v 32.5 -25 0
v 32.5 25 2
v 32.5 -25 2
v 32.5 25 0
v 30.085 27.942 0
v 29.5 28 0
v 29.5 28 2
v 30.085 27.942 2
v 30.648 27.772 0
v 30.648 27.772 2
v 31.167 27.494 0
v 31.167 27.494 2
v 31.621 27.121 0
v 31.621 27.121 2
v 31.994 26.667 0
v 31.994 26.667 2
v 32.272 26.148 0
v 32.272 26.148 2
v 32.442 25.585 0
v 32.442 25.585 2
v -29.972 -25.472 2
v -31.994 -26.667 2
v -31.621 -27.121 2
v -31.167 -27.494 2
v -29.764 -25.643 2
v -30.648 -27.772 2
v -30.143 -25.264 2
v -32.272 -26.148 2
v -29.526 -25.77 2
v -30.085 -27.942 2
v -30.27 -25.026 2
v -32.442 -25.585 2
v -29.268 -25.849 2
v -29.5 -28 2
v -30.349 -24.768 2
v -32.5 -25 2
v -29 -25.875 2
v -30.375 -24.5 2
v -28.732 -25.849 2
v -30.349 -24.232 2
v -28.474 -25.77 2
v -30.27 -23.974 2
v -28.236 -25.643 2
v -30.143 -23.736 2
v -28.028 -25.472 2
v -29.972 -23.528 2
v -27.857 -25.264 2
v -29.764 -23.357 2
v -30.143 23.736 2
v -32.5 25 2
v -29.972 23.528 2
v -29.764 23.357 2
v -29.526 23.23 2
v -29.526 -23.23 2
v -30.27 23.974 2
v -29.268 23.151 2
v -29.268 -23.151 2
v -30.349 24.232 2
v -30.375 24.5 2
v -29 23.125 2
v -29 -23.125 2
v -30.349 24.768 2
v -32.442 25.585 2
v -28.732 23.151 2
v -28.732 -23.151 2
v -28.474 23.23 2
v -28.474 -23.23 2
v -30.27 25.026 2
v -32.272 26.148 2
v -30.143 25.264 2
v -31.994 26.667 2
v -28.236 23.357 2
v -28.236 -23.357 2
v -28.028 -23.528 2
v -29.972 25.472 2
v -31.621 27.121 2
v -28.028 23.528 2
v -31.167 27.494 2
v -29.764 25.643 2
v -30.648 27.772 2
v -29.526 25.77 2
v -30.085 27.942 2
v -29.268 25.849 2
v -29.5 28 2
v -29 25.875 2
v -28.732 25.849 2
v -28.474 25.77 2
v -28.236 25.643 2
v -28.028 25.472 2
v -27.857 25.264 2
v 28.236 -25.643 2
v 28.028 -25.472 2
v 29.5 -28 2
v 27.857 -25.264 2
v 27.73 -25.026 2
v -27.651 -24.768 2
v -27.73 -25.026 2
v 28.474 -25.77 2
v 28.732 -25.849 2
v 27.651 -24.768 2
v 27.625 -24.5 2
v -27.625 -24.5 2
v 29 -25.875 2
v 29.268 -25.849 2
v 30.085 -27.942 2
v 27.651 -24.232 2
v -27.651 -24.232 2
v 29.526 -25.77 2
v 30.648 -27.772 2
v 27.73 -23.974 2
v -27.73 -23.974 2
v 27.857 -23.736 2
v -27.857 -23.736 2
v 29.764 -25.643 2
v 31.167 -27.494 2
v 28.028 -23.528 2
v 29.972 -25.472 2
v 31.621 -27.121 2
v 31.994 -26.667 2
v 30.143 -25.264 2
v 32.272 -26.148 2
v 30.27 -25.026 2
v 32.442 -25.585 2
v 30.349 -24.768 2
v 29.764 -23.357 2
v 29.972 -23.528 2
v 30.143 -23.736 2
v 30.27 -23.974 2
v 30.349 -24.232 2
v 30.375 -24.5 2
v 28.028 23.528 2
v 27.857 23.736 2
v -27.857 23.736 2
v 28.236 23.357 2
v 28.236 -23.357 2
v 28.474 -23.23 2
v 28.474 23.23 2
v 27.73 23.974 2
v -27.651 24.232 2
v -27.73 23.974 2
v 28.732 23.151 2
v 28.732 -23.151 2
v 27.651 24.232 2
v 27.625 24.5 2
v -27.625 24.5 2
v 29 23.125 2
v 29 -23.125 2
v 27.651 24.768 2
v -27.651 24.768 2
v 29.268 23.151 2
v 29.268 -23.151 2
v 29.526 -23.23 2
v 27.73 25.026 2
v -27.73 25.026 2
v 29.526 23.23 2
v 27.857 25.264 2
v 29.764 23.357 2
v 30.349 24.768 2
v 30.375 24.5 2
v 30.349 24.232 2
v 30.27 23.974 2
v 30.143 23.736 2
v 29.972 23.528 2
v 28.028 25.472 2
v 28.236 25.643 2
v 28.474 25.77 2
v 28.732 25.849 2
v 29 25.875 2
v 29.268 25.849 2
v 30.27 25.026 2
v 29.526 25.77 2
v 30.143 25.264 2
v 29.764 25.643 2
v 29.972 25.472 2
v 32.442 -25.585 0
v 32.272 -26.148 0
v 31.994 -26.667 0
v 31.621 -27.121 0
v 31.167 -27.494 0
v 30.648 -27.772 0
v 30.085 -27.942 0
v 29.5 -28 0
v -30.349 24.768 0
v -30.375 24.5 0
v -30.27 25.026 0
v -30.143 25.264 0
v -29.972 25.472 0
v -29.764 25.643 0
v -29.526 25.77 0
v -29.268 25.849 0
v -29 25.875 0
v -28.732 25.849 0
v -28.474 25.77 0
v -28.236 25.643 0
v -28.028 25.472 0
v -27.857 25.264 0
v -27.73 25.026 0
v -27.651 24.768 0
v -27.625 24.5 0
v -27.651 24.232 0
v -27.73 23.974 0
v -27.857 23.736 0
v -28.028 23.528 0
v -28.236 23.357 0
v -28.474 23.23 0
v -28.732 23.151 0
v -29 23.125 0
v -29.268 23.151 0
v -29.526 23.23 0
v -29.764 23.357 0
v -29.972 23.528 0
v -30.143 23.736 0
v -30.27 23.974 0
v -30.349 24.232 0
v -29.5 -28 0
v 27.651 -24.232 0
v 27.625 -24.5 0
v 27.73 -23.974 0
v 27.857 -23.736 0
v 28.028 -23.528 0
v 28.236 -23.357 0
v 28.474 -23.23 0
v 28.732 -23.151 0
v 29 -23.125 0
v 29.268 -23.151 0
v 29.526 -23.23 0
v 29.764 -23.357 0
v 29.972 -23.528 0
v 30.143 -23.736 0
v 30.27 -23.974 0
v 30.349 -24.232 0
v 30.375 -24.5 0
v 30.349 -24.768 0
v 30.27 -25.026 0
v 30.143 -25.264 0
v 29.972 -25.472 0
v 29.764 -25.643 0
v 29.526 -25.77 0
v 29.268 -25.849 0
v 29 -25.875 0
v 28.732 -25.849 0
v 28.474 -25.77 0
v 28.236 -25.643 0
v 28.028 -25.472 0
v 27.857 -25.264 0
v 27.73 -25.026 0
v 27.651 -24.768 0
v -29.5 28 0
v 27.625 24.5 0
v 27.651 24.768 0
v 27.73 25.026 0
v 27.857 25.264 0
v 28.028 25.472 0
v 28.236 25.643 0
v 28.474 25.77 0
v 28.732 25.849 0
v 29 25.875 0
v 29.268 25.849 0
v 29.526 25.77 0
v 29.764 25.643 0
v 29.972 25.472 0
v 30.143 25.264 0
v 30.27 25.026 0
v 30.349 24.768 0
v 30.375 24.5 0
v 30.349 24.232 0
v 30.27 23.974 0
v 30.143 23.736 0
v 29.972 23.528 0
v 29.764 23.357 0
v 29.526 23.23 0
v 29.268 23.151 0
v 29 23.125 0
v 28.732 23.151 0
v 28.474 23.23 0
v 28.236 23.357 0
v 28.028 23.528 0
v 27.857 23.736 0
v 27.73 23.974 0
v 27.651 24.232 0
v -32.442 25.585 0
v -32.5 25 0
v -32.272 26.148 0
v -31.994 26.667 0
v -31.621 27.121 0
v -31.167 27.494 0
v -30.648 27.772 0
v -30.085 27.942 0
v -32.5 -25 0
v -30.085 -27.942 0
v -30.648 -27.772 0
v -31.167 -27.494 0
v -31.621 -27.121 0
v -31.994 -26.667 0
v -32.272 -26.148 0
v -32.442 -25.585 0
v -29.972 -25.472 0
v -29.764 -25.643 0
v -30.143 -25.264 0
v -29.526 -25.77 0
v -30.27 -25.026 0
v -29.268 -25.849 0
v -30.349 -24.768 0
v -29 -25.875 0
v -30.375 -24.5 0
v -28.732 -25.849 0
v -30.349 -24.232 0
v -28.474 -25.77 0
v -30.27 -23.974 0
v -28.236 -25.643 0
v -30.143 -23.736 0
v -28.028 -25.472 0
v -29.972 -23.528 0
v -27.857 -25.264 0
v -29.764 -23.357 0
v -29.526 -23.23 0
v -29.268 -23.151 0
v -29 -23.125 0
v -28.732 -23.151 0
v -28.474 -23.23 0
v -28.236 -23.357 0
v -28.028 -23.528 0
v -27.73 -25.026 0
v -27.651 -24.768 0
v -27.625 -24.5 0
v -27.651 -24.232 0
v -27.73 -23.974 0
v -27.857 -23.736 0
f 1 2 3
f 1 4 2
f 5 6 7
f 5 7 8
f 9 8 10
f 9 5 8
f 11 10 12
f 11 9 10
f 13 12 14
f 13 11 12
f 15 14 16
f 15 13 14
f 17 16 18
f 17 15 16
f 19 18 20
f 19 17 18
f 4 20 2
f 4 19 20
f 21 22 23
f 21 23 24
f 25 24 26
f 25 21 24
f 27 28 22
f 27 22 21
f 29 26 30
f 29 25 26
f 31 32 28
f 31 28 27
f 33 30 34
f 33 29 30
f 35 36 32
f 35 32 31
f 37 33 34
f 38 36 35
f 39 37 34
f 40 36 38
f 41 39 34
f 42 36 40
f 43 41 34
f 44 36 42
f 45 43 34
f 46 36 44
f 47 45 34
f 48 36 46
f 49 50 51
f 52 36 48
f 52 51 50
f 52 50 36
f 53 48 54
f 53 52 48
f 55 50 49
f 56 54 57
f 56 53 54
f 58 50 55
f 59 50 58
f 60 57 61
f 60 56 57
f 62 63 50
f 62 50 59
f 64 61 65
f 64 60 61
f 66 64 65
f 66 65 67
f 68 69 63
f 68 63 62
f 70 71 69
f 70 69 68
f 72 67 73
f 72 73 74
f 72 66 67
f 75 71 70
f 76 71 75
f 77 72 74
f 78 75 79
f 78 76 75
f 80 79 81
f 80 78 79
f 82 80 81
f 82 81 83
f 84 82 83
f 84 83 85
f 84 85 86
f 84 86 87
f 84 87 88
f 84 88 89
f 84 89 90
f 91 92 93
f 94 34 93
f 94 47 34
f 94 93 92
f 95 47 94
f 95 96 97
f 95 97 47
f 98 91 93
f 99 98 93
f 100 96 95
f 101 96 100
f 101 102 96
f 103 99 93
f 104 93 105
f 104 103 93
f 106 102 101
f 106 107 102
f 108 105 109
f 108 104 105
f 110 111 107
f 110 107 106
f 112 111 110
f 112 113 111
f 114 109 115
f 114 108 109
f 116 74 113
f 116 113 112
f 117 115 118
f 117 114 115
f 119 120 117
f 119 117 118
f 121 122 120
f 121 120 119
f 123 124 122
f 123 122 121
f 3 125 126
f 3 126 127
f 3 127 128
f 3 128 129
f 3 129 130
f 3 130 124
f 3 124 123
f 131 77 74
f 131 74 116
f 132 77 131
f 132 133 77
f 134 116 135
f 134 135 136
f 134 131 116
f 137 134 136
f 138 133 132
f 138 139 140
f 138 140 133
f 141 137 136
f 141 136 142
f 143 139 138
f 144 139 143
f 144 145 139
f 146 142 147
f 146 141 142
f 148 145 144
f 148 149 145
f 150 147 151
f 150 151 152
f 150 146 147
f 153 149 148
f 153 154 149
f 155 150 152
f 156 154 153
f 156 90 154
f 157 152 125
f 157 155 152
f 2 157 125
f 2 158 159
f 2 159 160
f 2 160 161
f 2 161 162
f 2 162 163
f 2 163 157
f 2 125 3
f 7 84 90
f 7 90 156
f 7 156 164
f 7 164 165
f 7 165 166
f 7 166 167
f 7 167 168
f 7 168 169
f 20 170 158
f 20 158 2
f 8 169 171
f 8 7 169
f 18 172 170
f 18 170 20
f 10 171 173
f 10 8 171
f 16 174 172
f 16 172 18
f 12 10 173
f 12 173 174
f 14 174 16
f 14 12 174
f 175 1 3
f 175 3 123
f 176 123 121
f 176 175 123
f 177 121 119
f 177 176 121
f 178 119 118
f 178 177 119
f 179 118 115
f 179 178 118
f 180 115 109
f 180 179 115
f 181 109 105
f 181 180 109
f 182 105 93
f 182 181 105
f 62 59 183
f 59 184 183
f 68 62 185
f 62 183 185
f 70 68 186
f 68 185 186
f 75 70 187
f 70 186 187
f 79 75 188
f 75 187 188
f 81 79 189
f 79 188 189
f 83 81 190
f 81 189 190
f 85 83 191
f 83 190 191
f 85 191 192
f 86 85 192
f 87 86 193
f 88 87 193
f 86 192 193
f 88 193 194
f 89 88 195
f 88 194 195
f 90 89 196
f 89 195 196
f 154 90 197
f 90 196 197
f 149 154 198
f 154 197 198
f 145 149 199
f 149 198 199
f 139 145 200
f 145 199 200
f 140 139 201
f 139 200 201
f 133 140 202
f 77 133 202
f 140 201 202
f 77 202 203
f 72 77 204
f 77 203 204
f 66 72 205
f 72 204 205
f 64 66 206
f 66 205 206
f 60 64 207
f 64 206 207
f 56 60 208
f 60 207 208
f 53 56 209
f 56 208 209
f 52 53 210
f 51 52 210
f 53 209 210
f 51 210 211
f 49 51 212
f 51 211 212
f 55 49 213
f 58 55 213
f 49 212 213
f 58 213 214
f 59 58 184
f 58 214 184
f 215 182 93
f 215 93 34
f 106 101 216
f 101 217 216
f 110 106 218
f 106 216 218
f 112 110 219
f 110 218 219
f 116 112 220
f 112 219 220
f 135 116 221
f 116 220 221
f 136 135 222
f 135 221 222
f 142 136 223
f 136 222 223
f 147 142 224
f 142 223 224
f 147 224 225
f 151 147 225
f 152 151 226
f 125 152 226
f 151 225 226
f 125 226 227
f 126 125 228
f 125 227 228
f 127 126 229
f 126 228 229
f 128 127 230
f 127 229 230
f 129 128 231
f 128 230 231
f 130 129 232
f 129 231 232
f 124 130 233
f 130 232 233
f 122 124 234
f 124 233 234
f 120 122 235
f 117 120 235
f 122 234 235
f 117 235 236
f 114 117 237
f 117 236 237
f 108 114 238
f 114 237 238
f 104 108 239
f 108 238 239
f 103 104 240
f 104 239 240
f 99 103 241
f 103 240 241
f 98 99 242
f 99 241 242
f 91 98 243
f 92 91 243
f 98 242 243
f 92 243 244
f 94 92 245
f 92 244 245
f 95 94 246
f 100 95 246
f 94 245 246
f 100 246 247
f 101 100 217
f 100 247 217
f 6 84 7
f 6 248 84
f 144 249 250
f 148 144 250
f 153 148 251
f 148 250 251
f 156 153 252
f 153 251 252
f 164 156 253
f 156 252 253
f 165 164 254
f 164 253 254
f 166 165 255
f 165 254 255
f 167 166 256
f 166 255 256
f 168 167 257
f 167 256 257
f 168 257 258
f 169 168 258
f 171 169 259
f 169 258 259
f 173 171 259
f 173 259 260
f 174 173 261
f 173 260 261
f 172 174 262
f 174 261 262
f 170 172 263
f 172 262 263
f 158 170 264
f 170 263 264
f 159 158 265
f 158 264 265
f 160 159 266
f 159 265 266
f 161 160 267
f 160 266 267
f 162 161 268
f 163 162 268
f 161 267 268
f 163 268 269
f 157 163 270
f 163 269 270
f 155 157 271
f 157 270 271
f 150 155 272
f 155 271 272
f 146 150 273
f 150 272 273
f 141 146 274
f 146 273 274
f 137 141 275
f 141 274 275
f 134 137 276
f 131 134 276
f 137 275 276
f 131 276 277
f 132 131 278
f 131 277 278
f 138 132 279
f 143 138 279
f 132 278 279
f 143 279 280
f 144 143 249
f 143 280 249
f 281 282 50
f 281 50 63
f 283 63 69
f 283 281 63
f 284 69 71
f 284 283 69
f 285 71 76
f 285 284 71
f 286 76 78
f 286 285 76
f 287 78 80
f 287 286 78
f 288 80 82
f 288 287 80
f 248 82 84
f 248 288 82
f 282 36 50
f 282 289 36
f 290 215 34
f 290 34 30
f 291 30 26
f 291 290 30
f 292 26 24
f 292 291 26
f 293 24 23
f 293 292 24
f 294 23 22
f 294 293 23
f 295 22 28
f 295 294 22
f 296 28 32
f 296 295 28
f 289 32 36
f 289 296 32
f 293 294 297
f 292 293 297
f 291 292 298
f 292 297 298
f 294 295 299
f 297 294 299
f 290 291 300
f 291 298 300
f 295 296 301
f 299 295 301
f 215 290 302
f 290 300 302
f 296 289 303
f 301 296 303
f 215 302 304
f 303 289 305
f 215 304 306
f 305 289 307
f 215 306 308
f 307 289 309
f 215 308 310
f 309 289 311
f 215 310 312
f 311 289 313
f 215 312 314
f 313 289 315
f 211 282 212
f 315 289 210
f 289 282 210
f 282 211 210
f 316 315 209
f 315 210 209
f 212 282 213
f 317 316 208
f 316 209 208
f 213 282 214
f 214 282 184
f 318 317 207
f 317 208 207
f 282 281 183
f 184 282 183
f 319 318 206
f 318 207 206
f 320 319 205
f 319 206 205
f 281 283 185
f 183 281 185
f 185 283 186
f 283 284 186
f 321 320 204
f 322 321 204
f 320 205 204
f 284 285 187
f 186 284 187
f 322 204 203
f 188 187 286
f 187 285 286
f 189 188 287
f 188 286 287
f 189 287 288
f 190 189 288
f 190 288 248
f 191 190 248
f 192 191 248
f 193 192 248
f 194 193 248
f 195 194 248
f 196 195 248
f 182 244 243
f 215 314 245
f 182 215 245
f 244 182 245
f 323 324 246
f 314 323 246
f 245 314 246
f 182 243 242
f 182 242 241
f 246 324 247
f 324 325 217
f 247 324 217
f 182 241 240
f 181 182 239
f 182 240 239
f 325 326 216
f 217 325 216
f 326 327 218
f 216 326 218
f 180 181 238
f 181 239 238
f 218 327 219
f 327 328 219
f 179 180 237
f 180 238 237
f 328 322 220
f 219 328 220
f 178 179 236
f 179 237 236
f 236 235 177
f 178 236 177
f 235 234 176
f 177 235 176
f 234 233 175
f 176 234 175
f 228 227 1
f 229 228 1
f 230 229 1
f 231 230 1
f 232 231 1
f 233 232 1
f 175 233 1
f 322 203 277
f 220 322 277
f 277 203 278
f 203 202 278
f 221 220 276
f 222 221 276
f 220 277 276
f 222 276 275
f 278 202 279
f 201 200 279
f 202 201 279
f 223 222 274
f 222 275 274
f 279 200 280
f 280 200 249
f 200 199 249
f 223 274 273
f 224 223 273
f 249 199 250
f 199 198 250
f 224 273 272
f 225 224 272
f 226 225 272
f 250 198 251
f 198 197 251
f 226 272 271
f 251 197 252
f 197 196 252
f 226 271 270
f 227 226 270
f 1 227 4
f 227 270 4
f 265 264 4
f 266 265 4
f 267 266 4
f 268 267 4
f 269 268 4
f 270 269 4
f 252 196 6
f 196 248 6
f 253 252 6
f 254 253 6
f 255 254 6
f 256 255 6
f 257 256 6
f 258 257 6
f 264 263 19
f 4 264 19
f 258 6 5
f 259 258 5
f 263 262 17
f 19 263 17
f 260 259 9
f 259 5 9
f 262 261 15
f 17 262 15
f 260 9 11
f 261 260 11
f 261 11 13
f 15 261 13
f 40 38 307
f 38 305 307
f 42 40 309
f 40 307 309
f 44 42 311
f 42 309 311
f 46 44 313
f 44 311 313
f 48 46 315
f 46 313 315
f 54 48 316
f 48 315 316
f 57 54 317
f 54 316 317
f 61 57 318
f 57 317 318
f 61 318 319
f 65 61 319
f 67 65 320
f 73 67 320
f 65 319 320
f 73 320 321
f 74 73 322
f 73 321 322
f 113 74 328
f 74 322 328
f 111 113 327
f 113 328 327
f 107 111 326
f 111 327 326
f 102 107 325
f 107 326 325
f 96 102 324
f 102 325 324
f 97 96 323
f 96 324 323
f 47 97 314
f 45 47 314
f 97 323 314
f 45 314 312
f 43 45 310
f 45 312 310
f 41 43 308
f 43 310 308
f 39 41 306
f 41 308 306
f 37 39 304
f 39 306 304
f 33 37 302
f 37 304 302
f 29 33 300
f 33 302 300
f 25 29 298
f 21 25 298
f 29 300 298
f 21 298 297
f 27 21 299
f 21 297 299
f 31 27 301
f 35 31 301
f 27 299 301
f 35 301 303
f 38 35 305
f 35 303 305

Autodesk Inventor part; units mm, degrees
ref_plane "YZ Plane" through (0, 0, 0) normal (1, 0, 0) x (0, 1, 0)
ref_plane "XZ Plane" through (0, 0, 0) normal (0, 1, 0) x (-1, 0, 0)
ref_plane "XY Plane" through (0, 0, 0) normal (0, 0, 1) x (1, 0, 0)
sketch "Sketch1" plane through (0, 0, 0) normal (0, 0, 1) x (1, 0, 0)
  line L0 (-29.5, 28) -> (29.5, 28)
  line L1 (32.5, 25) -> (32.5, -25)
  line L2 (29.5, -28) -> (-29.5, -28)
  line L3 (-32.5, -25) -> (-32.5, 25)
  arc A0 (-29.5, 28) -> (-32.5, 25) centre (-29.5, 25) ccw
  arc A1 (32.5, 25) -> (29.5, 28) centre (29.5, 25) ccw
  arc A2 (29.5, -28) -> (32.5, -25) centre (29.5, -25) ccw
  arc A3 (-32.5, -25) -> (-29.5, -28) centre (-29.5, -25) ccw
  point P0 (0, 0)
  point P1 (-32.5, 28)
  point P2 (32.5, 28)
  point P3 (-32.5, -28)
  dimension "d0" = 65
  dimension "d1" = 56
  dimension "d2" = 28
  dimension "d3" = 32.5
  dimension "d4" = 3
extrude "Extrusion1" add sketch "Sketch1" along normal blind 2
sketch "Sketch2" plane through (0, 0, 0) normal (0, 0, -1) x (-1, 0, 0)
  circle A0 centre (29, 24.5) radius 1.375 projected
  circle A1 centre (-29, 24.5) radius 1.375 projected
  circle A2 centre (-29, -24.5) radius 1.375 projected
  circle A3 centre (29, -24.5) radius 1.375 projected
  point P0 (0, 0)
extrude "Extrusion2" cut sketch "Sketch2" against normal through all
equation "\"d2\" = 0.5 * d1"
equation "\"d3\" = 0.5 * d0"
properties part number "Touchscreen PCB"
